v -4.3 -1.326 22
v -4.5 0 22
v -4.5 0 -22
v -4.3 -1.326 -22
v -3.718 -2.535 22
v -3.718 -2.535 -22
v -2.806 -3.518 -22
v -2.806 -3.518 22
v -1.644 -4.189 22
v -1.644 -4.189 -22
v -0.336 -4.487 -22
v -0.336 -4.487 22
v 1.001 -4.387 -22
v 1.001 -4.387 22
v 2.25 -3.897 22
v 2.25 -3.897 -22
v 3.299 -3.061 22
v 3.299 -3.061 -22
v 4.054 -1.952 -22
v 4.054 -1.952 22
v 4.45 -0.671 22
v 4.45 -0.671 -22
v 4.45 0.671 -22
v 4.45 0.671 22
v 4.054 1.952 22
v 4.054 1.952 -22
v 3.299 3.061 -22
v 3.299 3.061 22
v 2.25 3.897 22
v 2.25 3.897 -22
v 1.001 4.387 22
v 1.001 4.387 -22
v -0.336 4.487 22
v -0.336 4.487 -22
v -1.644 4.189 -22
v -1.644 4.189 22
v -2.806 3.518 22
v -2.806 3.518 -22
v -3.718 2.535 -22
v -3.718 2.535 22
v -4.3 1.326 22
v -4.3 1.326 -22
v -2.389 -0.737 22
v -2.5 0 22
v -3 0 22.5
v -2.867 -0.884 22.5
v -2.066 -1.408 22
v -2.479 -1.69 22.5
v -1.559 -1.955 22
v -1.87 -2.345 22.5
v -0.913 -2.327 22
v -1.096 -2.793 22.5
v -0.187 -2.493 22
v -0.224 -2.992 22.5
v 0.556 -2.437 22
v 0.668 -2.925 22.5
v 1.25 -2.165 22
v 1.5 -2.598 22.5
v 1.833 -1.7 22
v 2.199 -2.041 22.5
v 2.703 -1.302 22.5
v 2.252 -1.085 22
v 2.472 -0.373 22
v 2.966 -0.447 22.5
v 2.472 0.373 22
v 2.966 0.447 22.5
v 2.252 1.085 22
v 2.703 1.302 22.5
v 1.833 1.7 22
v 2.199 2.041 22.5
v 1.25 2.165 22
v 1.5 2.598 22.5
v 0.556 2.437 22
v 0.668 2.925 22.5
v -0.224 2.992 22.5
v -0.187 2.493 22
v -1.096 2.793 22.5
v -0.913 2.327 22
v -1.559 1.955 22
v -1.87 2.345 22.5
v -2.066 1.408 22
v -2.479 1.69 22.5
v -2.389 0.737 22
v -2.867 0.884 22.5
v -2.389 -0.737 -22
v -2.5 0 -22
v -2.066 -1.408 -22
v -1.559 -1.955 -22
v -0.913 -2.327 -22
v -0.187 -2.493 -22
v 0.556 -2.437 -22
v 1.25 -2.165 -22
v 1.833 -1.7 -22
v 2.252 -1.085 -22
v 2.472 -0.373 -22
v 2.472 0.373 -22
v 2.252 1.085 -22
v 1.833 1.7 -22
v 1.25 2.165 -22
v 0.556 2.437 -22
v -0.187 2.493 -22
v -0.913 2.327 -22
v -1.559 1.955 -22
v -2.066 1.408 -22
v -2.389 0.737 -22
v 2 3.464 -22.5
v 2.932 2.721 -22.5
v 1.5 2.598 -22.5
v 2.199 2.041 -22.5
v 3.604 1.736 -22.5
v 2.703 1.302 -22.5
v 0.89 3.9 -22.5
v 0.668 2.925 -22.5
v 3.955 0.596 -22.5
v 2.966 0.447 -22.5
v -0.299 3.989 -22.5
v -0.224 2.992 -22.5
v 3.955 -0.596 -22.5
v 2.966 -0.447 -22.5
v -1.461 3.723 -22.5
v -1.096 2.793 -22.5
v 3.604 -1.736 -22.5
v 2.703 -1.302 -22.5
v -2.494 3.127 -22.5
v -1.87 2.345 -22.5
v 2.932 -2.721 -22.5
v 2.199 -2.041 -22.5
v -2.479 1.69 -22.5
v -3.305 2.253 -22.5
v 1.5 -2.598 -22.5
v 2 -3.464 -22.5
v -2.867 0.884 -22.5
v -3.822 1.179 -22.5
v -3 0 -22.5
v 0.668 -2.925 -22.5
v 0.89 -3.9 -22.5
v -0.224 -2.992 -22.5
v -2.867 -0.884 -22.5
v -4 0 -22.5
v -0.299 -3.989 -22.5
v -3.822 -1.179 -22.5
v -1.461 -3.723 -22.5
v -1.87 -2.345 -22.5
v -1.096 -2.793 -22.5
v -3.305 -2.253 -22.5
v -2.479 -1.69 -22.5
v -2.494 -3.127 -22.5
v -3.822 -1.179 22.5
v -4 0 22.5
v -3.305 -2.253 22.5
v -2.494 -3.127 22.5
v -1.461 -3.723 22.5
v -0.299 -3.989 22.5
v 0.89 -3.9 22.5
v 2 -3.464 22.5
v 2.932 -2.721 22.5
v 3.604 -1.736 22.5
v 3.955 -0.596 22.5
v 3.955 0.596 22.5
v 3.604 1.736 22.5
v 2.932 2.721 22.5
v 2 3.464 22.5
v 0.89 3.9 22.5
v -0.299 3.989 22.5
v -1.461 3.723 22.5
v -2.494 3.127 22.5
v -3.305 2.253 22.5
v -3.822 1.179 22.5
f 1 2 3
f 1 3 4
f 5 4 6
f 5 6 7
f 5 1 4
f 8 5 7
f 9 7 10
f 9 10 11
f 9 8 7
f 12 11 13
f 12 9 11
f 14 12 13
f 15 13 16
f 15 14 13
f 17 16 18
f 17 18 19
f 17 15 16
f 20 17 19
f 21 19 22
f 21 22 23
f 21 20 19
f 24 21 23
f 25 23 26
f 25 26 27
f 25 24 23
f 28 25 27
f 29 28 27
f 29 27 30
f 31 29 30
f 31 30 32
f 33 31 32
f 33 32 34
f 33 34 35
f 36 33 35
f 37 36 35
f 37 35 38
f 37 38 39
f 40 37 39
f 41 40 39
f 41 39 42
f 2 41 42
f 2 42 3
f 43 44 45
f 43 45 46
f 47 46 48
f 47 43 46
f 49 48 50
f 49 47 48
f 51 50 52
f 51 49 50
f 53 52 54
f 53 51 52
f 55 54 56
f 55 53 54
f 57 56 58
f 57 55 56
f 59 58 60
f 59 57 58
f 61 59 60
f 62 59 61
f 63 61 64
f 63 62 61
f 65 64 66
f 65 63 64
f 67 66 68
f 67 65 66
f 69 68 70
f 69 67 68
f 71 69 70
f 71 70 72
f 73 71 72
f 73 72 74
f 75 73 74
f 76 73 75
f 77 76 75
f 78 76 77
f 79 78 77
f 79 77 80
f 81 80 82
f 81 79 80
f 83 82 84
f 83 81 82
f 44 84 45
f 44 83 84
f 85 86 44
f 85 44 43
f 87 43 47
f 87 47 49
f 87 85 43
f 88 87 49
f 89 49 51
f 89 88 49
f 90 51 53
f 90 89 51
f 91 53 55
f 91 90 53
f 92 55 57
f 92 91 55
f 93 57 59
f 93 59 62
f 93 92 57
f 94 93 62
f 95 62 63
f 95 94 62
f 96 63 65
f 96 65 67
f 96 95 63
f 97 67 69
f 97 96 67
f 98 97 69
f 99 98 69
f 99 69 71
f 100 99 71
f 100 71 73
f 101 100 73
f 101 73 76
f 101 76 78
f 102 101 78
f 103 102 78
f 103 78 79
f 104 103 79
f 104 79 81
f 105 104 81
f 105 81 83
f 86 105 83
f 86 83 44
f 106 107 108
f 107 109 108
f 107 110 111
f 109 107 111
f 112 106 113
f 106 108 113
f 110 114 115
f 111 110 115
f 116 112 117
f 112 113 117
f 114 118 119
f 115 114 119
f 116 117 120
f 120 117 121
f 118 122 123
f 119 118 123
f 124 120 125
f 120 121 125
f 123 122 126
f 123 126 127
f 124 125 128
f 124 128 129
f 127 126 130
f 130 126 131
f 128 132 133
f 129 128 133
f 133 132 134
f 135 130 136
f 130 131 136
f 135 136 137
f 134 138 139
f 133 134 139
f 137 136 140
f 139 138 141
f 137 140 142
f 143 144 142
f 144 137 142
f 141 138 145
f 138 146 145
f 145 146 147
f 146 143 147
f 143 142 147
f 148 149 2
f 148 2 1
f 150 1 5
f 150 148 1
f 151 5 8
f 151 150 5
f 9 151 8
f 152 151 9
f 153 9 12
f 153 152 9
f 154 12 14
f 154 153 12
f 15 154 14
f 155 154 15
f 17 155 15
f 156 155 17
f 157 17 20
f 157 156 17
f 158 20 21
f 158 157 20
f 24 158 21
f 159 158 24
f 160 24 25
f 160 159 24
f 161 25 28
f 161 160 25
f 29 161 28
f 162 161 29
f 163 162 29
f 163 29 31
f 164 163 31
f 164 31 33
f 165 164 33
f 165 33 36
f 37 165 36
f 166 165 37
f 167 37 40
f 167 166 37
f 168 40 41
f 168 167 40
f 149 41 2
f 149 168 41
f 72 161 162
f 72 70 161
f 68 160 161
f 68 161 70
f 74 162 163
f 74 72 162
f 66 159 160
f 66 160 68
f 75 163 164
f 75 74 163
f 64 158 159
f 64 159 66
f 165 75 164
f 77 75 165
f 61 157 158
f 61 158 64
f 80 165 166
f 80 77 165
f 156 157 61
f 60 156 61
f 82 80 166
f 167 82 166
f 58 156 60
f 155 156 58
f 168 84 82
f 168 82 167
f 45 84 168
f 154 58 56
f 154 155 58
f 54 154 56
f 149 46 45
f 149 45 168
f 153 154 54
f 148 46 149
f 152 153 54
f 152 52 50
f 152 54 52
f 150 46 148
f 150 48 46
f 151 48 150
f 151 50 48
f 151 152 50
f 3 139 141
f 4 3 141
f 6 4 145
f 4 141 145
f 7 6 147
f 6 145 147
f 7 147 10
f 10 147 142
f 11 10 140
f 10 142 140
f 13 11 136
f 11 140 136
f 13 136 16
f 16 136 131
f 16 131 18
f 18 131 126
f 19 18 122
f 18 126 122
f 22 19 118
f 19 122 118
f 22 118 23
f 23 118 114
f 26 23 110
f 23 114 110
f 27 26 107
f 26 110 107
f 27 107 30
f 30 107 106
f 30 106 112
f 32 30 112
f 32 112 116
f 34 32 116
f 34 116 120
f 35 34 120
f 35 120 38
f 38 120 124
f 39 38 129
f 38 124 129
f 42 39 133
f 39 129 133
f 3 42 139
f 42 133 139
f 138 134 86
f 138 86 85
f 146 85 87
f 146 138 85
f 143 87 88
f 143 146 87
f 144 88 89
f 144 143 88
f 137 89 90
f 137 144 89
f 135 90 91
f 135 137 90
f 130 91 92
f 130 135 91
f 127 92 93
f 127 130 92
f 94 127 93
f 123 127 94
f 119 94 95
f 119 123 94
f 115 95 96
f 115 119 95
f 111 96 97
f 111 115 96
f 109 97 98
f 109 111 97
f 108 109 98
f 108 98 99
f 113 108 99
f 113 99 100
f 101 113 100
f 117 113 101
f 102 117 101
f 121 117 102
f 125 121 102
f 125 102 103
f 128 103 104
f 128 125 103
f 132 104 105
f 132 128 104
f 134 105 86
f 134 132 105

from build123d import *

# Parameters (mm, degrees)
SKETCH1_R           = 4.5
SKETCH1_R_2         = 2.5
BOSS_EXTRUDE1_DEPTH = 22.5
CHAMFER1_SIZE       = 0.5


with BuildPart() as part:
    # Sketch1 → Boss-Extrude1 (new, symmetric)
    with BuildSketch(Plane.XY):
        with Locations(Location((0, 0, 0), (0, 0, 180))):
            Circle(SKETCH1_R)
        with Locations(Location((0, 0, 0), (0, 0, 180))):
            Circle(SKETCH1_R_2, mode=Mode.SUBTRACT)
    extrude(amount=BOSS_EXTRUDE1_DEPTH, both=True)

    # Chamfer1
    chamfer1_edges = [part.edges().sort_by_distance(p)[0] for p in [
        (4.5, 0, -22.5),
        (4.5, 0, 22.5),
        (2.5, 0, -22.5),
        (2.5, 0, 22.5),
    ]]
    chamfer(chamfer1_edges, length=CHAMFER1_SIZE)


solid = part.part
